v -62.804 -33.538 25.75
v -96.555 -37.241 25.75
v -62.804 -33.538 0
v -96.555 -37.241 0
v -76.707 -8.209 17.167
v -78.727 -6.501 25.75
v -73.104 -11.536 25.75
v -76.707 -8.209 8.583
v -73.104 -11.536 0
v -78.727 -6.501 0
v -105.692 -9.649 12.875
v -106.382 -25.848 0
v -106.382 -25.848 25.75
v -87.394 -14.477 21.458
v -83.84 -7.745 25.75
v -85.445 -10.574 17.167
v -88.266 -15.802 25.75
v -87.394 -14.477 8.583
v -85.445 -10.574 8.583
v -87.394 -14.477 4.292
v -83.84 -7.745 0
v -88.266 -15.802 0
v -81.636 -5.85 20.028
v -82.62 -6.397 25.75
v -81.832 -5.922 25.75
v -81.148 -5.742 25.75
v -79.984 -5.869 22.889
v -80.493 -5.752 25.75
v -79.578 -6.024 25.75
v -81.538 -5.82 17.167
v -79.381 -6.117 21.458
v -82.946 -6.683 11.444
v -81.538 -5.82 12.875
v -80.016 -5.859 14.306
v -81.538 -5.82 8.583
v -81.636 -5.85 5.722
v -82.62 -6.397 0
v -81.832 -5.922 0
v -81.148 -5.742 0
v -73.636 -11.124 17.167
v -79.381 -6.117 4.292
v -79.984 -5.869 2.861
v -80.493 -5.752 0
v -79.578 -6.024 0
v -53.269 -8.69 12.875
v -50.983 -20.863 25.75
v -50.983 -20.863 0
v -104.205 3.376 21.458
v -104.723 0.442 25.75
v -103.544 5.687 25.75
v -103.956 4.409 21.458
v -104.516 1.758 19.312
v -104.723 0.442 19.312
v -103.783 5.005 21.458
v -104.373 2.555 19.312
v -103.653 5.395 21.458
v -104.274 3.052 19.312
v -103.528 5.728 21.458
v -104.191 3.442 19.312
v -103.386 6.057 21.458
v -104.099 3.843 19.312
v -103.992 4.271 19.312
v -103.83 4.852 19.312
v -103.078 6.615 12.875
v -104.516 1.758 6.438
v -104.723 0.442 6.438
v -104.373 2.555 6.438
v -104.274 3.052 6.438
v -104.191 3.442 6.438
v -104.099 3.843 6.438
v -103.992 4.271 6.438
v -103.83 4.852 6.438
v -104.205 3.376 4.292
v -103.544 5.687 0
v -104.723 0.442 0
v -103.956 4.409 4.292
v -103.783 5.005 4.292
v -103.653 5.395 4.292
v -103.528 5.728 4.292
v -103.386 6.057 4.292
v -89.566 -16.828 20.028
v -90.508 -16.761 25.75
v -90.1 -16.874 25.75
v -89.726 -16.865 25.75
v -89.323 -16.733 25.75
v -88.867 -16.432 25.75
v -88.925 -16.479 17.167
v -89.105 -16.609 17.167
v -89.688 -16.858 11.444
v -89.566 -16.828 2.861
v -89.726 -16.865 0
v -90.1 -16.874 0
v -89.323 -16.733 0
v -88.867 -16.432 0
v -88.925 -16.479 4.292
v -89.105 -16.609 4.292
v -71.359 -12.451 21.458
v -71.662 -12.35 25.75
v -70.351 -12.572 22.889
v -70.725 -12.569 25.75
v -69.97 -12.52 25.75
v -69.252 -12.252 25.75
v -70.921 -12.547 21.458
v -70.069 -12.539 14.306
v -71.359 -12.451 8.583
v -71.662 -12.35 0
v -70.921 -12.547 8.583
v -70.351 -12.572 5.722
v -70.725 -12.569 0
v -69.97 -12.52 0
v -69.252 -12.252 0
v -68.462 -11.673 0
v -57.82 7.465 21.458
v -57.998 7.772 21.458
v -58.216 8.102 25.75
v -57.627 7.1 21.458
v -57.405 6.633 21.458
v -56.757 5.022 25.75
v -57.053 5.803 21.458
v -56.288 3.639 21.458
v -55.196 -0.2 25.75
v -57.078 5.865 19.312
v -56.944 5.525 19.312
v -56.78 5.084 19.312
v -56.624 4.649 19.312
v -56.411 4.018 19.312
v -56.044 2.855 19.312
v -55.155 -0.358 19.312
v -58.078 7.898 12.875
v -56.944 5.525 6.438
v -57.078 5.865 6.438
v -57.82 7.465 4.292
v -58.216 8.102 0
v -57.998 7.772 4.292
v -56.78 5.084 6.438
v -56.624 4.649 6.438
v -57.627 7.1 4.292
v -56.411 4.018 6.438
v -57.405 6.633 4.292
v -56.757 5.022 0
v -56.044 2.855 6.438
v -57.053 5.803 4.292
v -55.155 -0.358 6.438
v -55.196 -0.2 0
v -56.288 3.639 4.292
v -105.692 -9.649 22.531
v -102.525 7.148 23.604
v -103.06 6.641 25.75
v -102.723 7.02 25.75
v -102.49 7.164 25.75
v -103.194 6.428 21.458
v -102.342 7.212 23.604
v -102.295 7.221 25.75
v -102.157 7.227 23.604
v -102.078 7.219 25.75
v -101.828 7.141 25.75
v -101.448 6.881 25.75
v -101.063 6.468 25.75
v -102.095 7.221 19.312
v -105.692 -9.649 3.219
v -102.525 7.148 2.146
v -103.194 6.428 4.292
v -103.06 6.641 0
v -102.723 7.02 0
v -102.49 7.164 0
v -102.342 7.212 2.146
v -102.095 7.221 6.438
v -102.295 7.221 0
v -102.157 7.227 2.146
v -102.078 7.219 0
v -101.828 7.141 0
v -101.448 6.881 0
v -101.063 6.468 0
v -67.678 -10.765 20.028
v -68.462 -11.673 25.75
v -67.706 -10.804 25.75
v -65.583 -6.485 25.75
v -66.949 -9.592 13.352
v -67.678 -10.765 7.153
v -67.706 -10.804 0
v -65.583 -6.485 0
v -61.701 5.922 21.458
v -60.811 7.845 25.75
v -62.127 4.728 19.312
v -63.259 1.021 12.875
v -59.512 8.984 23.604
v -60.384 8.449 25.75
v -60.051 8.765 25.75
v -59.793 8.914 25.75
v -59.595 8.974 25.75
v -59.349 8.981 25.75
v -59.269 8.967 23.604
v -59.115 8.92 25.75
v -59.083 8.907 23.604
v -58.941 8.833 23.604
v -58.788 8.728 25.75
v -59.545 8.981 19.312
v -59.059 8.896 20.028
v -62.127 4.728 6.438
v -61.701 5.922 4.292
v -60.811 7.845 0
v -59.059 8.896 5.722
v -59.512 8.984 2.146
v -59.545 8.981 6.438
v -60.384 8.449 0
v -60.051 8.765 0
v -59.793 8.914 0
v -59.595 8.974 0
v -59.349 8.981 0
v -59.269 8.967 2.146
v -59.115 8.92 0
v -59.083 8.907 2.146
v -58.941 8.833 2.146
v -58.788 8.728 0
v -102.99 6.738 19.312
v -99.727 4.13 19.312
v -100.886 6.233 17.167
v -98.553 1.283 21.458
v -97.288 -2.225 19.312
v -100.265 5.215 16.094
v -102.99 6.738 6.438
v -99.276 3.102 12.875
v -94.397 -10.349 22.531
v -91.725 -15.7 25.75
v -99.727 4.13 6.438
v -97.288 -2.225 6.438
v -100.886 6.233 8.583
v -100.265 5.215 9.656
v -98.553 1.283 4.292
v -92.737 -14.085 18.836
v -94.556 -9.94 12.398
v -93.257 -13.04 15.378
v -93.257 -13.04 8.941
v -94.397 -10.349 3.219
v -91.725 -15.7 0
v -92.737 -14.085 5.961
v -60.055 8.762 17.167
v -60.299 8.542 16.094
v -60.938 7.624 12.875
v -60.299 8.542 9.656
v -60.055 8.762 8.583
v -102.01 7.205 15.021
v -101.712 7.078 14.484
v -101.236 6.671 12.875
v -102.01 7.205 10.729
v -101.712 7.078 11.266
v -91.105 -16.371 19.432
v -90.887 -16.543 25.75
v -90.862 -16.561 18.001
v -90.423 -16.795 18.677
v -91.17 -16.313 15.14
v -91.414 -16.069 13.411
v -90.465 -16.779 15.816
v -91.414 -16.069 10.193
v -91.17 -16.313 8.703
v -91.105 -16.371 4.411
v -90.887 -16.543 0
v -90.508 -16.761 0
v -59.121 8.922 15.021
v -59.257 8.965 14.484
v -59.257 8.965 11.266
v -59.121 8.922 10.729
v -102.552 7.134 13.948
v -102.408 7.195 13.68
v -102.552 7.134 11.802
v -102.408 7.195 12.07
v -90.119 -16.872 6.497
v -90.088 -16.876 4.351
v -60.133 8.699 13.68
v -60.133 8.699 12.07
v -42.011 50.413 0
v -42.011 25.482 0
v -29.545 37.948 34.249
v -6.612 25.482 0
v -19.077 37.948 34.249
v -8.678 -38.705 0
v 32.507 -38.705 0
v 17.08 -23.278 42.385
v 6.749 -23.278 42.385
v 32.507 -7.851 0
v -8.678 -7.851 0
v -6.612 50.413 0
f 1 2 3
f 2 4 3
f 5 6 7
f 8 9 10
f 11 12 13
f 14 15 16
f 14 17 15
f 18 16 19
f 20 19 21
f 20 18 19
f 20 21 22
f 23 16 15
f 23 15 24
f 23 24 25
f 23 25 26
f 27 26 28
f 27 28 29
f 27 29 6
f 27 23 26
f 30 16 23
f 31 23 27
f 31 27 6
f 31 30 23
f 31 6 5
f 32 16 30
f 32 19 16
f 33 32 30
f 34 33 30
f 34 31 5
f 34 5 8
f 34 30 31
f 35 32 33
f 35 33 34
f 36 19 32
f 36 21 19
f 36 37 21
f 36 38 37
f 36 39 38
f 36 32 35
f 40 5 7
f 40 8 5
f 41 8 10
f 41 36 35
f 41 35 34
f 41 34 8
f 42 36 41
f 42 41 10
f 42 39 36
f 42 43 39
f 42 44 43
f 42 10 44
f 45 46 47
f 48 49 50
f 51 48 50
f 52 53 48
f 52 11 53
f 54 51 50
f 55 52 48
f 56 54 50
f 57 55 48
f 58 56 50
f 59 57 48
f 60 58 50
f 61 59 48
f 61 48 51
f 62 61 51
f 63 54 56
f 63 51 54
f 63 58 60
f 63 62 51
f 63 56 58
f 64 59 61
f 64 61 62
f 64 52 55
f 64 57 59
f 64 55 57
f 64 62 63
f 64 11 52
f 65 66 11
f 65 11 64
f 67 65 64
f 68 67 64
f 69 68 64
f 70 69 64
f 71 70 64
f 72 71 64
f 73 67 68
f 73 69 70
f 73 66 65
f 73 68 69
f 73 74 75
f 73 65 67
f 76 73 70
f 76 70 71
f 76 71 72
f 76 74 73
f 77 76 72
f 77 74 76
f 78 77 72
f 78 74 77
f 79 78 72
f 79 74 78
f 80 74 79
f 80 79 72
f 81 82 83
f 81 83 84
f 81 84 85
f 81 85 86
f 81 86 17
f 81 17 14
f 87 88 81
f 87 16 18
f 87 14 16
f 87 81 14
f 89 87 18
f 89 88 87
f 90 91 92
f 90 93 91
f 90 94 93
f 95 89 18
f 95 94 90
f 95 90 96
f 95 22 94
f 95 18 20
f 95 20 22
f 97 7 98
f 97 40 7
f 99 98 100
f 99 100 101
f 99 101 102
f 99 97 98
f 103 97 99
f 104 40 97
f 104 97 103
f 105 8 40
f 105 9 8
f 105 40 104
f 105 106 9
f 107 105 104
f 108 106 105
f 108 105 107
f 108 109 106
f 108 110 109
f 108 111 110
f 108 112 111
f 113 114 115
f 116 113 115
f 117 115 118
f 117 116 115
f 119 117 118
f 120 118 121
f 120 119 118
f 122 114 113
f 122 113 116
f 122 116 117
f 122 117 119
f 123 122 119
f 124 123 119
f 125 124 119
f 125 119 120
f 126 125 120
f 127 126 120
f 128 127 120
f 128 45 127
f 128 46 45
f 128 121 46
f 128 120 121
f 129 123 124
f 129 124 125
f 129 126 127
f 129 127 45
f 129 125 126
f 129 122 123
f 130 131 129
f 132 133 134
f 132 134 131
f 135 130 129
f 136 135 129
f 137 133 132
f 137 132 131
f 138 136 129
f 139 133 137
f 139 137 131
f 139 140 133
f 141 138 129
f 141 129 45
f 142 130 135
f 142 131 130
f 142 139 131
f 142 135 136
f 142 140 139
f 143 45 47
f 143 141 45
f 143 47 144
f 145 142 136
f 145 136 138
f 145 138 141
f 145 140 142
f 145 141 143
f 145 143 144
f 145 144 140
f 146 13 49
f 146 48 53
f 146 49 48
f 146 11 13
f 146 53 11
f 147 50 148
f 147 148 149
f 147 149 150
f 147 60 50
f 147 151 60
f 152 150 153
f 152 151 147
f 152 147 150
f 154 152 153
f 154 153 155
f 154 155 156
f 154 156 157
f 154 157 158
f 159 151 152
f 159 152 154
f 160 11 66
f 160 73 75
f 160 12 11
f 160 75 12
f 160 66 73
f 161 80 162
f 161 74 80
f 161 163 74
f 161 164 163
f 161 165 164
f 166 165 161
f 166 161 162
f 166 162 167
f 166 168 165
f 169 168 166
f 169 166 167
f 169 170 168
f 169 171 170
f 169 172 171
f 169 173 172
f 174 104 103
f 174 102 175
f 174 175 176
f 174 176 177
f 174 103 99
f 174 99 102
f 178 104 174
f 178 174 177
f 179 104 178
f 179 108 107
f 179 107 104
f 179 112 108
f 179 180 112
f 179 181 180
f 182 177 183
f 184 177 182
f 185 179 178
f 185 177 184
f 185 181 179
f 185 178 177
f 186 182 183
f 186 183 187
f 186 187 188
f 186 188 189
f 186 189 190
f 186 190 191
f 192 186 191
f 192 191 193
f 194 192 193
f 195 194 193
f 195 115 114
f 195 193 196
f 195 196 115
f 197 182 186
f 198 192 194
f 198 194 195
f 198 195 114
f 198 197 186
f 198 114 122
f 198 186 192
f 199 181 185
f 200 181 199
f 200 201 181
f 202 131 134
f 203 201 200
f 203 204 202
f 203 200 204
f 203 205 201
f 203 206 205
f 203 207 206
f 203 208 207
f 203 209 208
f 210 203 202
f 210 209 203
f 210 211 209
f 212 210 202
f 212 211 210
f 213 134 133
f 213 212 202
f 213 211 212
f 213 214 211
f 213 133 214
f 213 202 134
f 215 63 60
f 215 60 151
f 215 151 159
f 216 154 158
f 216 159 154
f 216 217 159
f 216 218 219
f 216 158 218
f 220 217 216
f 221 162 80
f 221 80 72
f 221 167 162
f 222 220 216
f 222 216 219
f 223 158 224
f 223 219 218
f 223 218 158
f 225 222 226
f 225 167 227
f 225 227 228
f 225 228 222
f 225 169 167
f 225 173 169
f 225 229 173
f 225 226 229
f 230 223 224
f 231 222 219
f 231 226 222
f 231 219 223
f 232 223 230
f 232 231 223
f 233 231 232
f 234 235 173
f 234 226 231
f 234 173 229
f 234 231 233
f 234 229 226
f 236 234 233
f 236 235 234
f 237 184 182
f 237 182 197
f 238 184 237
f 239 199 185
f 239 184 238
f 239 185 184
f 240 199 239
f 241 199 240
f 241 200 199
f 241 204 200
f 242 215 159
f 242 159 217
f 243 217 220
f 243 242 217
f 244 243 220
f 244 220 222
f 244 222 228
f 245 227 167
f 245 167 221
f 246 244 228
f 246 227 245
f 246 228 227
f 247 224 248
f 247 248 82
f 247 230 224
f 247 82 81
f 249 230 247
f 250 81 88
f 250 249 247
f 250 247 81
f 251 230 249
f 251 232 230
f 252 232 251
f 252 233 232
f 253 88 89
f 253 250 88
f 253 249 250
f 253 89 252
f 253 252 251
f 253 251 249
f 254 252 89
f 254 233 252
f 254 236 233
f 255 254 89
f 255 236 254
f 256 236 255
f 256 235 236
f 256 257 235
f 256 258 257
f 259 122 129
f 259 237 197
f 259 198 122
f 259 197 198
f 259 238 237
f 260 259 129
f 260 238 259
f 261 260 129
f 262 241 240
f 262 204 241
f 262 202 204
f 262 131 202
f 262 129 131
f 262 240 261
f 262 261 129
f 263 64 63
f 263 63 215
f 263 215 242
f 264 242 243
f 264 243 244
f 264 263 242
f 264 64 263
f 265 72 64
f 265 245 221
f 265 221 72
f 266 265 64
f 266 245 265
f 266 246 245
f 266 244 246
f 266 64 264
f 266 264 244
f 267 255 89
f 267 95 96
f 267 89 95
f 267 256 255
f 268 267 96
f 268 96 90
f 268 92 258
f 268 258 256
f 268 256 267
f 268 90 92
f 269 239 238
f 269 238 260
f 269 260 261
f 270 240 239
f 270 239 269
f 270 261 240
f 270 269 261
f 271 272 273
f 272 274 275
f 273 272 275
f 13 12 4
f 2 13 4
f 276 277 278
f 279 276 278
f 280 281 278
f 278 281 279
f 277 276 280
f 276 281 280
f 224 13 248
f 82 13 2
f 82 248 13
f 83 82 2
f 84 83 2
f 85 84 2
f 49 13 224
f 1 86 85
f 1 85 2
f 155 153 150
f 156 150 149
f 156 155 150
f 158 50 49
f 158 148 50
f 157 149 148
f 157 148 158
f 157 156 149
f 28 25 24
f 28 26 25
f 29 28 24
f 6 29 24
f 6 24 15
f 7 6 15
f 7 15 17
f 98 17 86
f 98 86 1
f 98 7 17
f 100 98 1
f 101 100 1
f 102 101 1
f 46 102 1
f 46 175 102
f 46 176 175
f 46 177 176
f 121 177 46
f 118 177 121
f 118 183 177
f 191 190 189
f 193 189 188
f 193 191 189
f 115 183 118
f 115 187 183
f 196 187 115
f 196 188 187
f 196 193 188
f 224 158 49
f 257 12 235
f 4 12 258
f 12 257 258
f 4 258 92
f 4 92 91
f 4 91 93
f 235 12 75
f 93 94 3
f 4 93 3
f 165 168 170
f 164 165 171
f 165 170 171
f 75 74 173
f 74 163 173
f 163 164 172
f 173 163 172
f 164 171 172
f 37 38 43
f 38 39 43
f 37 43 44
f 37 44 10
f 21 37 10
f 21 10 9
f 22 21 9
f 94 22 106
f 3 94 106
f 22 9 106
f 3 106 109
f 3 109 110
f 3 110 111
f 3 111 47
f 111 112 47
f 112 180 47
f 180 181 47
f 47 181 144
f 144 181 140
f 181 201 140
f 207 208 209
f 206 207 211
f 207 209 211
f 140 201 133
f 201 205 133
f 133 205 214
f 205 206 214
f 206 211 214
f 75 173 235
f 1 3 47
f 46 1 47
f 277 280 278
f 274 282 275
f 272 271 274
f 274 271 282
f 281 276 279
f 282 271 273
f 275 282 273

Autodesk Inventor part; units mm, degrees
ref_plane "YZ Plane" through (0, 0, 0) normal (1, 0, 0) x (0, 1, 0)
ref_plane "XZ Plane" through (0, 0, 0) normal (0, 1, 0) x (-1, 0, 0)
ref_plane "XY Plane" through (0, 0, 0) normal (0, 0, 1) x (1, 0, 0)
sketch "Sketch1" plane through (0, 0, 0) normal (0, 0, 1) x (1, 0, 0)
  line L0 (-42.011, 50.4132) -> (-6.6116, 50.4132)
  line L1 (-6.6116, 50.4132) -> (-6.6116, 25.4821)
  line L2 (-6.6116, 25.4821) -> (-42.011, 25.4821)
  line L3 (-42.011, 25.4821) -> (-42.011, 50.4132)
  line L4 (-8.6777, -7.8512) -> (32.5069, -7.8512)
  line L5 (32.5069, -7.8512) -> (32.5069, -38.7052)
  line L6 (32.5069, -38.7052) -> (-8.6777, -38.7052)
  line L7 (-8.6777, -38.7052) -> (-8.6777, -7.8512)
  point P0 (0, 0)
extrude "Extrusion1" add sketch "Sketch1" along normal blind 50 draft -20
sketch "Sketch2" plane through (0, 0, 0) normal (0, 0, 1) x (1, 0, 0)
  spline S0 degree 4 poles (-106.3816, -25.8477) (-104.1931, 56.0594) (-90.2973, -65.9059) (-87.8849, 50.5385) (-60.7887, -55.8152) (-63.7982, 52.462) (-50.9834, -20.8633) knots 0 0 0 0 0 0.428444 0.577687 1 1 1 1 1
  line L0 (-106.3816, -25.8477) -> (-96.5552, -37.2407)
  line L1 (-96.5552, -37.2407) -> (-62.8036, -33.538)
  line L2 (-62.8036, -33.538) -> (-50.9834, -20.8633)
  point P0 (0, 0)
  point P1 (-96.5556, -4.3439)
  point P2 (-88.5804, -16.1639)
  point P3 (-81.3176, -5.7681)
  point P4 (-72.0604, -12.1762)
  point P5 (-63.943, -1.3531)
extrude "Extrusion2" add sketch "Sketch2" along normal blind 25.75 separate body
properties part number "DemoSimplePart"
